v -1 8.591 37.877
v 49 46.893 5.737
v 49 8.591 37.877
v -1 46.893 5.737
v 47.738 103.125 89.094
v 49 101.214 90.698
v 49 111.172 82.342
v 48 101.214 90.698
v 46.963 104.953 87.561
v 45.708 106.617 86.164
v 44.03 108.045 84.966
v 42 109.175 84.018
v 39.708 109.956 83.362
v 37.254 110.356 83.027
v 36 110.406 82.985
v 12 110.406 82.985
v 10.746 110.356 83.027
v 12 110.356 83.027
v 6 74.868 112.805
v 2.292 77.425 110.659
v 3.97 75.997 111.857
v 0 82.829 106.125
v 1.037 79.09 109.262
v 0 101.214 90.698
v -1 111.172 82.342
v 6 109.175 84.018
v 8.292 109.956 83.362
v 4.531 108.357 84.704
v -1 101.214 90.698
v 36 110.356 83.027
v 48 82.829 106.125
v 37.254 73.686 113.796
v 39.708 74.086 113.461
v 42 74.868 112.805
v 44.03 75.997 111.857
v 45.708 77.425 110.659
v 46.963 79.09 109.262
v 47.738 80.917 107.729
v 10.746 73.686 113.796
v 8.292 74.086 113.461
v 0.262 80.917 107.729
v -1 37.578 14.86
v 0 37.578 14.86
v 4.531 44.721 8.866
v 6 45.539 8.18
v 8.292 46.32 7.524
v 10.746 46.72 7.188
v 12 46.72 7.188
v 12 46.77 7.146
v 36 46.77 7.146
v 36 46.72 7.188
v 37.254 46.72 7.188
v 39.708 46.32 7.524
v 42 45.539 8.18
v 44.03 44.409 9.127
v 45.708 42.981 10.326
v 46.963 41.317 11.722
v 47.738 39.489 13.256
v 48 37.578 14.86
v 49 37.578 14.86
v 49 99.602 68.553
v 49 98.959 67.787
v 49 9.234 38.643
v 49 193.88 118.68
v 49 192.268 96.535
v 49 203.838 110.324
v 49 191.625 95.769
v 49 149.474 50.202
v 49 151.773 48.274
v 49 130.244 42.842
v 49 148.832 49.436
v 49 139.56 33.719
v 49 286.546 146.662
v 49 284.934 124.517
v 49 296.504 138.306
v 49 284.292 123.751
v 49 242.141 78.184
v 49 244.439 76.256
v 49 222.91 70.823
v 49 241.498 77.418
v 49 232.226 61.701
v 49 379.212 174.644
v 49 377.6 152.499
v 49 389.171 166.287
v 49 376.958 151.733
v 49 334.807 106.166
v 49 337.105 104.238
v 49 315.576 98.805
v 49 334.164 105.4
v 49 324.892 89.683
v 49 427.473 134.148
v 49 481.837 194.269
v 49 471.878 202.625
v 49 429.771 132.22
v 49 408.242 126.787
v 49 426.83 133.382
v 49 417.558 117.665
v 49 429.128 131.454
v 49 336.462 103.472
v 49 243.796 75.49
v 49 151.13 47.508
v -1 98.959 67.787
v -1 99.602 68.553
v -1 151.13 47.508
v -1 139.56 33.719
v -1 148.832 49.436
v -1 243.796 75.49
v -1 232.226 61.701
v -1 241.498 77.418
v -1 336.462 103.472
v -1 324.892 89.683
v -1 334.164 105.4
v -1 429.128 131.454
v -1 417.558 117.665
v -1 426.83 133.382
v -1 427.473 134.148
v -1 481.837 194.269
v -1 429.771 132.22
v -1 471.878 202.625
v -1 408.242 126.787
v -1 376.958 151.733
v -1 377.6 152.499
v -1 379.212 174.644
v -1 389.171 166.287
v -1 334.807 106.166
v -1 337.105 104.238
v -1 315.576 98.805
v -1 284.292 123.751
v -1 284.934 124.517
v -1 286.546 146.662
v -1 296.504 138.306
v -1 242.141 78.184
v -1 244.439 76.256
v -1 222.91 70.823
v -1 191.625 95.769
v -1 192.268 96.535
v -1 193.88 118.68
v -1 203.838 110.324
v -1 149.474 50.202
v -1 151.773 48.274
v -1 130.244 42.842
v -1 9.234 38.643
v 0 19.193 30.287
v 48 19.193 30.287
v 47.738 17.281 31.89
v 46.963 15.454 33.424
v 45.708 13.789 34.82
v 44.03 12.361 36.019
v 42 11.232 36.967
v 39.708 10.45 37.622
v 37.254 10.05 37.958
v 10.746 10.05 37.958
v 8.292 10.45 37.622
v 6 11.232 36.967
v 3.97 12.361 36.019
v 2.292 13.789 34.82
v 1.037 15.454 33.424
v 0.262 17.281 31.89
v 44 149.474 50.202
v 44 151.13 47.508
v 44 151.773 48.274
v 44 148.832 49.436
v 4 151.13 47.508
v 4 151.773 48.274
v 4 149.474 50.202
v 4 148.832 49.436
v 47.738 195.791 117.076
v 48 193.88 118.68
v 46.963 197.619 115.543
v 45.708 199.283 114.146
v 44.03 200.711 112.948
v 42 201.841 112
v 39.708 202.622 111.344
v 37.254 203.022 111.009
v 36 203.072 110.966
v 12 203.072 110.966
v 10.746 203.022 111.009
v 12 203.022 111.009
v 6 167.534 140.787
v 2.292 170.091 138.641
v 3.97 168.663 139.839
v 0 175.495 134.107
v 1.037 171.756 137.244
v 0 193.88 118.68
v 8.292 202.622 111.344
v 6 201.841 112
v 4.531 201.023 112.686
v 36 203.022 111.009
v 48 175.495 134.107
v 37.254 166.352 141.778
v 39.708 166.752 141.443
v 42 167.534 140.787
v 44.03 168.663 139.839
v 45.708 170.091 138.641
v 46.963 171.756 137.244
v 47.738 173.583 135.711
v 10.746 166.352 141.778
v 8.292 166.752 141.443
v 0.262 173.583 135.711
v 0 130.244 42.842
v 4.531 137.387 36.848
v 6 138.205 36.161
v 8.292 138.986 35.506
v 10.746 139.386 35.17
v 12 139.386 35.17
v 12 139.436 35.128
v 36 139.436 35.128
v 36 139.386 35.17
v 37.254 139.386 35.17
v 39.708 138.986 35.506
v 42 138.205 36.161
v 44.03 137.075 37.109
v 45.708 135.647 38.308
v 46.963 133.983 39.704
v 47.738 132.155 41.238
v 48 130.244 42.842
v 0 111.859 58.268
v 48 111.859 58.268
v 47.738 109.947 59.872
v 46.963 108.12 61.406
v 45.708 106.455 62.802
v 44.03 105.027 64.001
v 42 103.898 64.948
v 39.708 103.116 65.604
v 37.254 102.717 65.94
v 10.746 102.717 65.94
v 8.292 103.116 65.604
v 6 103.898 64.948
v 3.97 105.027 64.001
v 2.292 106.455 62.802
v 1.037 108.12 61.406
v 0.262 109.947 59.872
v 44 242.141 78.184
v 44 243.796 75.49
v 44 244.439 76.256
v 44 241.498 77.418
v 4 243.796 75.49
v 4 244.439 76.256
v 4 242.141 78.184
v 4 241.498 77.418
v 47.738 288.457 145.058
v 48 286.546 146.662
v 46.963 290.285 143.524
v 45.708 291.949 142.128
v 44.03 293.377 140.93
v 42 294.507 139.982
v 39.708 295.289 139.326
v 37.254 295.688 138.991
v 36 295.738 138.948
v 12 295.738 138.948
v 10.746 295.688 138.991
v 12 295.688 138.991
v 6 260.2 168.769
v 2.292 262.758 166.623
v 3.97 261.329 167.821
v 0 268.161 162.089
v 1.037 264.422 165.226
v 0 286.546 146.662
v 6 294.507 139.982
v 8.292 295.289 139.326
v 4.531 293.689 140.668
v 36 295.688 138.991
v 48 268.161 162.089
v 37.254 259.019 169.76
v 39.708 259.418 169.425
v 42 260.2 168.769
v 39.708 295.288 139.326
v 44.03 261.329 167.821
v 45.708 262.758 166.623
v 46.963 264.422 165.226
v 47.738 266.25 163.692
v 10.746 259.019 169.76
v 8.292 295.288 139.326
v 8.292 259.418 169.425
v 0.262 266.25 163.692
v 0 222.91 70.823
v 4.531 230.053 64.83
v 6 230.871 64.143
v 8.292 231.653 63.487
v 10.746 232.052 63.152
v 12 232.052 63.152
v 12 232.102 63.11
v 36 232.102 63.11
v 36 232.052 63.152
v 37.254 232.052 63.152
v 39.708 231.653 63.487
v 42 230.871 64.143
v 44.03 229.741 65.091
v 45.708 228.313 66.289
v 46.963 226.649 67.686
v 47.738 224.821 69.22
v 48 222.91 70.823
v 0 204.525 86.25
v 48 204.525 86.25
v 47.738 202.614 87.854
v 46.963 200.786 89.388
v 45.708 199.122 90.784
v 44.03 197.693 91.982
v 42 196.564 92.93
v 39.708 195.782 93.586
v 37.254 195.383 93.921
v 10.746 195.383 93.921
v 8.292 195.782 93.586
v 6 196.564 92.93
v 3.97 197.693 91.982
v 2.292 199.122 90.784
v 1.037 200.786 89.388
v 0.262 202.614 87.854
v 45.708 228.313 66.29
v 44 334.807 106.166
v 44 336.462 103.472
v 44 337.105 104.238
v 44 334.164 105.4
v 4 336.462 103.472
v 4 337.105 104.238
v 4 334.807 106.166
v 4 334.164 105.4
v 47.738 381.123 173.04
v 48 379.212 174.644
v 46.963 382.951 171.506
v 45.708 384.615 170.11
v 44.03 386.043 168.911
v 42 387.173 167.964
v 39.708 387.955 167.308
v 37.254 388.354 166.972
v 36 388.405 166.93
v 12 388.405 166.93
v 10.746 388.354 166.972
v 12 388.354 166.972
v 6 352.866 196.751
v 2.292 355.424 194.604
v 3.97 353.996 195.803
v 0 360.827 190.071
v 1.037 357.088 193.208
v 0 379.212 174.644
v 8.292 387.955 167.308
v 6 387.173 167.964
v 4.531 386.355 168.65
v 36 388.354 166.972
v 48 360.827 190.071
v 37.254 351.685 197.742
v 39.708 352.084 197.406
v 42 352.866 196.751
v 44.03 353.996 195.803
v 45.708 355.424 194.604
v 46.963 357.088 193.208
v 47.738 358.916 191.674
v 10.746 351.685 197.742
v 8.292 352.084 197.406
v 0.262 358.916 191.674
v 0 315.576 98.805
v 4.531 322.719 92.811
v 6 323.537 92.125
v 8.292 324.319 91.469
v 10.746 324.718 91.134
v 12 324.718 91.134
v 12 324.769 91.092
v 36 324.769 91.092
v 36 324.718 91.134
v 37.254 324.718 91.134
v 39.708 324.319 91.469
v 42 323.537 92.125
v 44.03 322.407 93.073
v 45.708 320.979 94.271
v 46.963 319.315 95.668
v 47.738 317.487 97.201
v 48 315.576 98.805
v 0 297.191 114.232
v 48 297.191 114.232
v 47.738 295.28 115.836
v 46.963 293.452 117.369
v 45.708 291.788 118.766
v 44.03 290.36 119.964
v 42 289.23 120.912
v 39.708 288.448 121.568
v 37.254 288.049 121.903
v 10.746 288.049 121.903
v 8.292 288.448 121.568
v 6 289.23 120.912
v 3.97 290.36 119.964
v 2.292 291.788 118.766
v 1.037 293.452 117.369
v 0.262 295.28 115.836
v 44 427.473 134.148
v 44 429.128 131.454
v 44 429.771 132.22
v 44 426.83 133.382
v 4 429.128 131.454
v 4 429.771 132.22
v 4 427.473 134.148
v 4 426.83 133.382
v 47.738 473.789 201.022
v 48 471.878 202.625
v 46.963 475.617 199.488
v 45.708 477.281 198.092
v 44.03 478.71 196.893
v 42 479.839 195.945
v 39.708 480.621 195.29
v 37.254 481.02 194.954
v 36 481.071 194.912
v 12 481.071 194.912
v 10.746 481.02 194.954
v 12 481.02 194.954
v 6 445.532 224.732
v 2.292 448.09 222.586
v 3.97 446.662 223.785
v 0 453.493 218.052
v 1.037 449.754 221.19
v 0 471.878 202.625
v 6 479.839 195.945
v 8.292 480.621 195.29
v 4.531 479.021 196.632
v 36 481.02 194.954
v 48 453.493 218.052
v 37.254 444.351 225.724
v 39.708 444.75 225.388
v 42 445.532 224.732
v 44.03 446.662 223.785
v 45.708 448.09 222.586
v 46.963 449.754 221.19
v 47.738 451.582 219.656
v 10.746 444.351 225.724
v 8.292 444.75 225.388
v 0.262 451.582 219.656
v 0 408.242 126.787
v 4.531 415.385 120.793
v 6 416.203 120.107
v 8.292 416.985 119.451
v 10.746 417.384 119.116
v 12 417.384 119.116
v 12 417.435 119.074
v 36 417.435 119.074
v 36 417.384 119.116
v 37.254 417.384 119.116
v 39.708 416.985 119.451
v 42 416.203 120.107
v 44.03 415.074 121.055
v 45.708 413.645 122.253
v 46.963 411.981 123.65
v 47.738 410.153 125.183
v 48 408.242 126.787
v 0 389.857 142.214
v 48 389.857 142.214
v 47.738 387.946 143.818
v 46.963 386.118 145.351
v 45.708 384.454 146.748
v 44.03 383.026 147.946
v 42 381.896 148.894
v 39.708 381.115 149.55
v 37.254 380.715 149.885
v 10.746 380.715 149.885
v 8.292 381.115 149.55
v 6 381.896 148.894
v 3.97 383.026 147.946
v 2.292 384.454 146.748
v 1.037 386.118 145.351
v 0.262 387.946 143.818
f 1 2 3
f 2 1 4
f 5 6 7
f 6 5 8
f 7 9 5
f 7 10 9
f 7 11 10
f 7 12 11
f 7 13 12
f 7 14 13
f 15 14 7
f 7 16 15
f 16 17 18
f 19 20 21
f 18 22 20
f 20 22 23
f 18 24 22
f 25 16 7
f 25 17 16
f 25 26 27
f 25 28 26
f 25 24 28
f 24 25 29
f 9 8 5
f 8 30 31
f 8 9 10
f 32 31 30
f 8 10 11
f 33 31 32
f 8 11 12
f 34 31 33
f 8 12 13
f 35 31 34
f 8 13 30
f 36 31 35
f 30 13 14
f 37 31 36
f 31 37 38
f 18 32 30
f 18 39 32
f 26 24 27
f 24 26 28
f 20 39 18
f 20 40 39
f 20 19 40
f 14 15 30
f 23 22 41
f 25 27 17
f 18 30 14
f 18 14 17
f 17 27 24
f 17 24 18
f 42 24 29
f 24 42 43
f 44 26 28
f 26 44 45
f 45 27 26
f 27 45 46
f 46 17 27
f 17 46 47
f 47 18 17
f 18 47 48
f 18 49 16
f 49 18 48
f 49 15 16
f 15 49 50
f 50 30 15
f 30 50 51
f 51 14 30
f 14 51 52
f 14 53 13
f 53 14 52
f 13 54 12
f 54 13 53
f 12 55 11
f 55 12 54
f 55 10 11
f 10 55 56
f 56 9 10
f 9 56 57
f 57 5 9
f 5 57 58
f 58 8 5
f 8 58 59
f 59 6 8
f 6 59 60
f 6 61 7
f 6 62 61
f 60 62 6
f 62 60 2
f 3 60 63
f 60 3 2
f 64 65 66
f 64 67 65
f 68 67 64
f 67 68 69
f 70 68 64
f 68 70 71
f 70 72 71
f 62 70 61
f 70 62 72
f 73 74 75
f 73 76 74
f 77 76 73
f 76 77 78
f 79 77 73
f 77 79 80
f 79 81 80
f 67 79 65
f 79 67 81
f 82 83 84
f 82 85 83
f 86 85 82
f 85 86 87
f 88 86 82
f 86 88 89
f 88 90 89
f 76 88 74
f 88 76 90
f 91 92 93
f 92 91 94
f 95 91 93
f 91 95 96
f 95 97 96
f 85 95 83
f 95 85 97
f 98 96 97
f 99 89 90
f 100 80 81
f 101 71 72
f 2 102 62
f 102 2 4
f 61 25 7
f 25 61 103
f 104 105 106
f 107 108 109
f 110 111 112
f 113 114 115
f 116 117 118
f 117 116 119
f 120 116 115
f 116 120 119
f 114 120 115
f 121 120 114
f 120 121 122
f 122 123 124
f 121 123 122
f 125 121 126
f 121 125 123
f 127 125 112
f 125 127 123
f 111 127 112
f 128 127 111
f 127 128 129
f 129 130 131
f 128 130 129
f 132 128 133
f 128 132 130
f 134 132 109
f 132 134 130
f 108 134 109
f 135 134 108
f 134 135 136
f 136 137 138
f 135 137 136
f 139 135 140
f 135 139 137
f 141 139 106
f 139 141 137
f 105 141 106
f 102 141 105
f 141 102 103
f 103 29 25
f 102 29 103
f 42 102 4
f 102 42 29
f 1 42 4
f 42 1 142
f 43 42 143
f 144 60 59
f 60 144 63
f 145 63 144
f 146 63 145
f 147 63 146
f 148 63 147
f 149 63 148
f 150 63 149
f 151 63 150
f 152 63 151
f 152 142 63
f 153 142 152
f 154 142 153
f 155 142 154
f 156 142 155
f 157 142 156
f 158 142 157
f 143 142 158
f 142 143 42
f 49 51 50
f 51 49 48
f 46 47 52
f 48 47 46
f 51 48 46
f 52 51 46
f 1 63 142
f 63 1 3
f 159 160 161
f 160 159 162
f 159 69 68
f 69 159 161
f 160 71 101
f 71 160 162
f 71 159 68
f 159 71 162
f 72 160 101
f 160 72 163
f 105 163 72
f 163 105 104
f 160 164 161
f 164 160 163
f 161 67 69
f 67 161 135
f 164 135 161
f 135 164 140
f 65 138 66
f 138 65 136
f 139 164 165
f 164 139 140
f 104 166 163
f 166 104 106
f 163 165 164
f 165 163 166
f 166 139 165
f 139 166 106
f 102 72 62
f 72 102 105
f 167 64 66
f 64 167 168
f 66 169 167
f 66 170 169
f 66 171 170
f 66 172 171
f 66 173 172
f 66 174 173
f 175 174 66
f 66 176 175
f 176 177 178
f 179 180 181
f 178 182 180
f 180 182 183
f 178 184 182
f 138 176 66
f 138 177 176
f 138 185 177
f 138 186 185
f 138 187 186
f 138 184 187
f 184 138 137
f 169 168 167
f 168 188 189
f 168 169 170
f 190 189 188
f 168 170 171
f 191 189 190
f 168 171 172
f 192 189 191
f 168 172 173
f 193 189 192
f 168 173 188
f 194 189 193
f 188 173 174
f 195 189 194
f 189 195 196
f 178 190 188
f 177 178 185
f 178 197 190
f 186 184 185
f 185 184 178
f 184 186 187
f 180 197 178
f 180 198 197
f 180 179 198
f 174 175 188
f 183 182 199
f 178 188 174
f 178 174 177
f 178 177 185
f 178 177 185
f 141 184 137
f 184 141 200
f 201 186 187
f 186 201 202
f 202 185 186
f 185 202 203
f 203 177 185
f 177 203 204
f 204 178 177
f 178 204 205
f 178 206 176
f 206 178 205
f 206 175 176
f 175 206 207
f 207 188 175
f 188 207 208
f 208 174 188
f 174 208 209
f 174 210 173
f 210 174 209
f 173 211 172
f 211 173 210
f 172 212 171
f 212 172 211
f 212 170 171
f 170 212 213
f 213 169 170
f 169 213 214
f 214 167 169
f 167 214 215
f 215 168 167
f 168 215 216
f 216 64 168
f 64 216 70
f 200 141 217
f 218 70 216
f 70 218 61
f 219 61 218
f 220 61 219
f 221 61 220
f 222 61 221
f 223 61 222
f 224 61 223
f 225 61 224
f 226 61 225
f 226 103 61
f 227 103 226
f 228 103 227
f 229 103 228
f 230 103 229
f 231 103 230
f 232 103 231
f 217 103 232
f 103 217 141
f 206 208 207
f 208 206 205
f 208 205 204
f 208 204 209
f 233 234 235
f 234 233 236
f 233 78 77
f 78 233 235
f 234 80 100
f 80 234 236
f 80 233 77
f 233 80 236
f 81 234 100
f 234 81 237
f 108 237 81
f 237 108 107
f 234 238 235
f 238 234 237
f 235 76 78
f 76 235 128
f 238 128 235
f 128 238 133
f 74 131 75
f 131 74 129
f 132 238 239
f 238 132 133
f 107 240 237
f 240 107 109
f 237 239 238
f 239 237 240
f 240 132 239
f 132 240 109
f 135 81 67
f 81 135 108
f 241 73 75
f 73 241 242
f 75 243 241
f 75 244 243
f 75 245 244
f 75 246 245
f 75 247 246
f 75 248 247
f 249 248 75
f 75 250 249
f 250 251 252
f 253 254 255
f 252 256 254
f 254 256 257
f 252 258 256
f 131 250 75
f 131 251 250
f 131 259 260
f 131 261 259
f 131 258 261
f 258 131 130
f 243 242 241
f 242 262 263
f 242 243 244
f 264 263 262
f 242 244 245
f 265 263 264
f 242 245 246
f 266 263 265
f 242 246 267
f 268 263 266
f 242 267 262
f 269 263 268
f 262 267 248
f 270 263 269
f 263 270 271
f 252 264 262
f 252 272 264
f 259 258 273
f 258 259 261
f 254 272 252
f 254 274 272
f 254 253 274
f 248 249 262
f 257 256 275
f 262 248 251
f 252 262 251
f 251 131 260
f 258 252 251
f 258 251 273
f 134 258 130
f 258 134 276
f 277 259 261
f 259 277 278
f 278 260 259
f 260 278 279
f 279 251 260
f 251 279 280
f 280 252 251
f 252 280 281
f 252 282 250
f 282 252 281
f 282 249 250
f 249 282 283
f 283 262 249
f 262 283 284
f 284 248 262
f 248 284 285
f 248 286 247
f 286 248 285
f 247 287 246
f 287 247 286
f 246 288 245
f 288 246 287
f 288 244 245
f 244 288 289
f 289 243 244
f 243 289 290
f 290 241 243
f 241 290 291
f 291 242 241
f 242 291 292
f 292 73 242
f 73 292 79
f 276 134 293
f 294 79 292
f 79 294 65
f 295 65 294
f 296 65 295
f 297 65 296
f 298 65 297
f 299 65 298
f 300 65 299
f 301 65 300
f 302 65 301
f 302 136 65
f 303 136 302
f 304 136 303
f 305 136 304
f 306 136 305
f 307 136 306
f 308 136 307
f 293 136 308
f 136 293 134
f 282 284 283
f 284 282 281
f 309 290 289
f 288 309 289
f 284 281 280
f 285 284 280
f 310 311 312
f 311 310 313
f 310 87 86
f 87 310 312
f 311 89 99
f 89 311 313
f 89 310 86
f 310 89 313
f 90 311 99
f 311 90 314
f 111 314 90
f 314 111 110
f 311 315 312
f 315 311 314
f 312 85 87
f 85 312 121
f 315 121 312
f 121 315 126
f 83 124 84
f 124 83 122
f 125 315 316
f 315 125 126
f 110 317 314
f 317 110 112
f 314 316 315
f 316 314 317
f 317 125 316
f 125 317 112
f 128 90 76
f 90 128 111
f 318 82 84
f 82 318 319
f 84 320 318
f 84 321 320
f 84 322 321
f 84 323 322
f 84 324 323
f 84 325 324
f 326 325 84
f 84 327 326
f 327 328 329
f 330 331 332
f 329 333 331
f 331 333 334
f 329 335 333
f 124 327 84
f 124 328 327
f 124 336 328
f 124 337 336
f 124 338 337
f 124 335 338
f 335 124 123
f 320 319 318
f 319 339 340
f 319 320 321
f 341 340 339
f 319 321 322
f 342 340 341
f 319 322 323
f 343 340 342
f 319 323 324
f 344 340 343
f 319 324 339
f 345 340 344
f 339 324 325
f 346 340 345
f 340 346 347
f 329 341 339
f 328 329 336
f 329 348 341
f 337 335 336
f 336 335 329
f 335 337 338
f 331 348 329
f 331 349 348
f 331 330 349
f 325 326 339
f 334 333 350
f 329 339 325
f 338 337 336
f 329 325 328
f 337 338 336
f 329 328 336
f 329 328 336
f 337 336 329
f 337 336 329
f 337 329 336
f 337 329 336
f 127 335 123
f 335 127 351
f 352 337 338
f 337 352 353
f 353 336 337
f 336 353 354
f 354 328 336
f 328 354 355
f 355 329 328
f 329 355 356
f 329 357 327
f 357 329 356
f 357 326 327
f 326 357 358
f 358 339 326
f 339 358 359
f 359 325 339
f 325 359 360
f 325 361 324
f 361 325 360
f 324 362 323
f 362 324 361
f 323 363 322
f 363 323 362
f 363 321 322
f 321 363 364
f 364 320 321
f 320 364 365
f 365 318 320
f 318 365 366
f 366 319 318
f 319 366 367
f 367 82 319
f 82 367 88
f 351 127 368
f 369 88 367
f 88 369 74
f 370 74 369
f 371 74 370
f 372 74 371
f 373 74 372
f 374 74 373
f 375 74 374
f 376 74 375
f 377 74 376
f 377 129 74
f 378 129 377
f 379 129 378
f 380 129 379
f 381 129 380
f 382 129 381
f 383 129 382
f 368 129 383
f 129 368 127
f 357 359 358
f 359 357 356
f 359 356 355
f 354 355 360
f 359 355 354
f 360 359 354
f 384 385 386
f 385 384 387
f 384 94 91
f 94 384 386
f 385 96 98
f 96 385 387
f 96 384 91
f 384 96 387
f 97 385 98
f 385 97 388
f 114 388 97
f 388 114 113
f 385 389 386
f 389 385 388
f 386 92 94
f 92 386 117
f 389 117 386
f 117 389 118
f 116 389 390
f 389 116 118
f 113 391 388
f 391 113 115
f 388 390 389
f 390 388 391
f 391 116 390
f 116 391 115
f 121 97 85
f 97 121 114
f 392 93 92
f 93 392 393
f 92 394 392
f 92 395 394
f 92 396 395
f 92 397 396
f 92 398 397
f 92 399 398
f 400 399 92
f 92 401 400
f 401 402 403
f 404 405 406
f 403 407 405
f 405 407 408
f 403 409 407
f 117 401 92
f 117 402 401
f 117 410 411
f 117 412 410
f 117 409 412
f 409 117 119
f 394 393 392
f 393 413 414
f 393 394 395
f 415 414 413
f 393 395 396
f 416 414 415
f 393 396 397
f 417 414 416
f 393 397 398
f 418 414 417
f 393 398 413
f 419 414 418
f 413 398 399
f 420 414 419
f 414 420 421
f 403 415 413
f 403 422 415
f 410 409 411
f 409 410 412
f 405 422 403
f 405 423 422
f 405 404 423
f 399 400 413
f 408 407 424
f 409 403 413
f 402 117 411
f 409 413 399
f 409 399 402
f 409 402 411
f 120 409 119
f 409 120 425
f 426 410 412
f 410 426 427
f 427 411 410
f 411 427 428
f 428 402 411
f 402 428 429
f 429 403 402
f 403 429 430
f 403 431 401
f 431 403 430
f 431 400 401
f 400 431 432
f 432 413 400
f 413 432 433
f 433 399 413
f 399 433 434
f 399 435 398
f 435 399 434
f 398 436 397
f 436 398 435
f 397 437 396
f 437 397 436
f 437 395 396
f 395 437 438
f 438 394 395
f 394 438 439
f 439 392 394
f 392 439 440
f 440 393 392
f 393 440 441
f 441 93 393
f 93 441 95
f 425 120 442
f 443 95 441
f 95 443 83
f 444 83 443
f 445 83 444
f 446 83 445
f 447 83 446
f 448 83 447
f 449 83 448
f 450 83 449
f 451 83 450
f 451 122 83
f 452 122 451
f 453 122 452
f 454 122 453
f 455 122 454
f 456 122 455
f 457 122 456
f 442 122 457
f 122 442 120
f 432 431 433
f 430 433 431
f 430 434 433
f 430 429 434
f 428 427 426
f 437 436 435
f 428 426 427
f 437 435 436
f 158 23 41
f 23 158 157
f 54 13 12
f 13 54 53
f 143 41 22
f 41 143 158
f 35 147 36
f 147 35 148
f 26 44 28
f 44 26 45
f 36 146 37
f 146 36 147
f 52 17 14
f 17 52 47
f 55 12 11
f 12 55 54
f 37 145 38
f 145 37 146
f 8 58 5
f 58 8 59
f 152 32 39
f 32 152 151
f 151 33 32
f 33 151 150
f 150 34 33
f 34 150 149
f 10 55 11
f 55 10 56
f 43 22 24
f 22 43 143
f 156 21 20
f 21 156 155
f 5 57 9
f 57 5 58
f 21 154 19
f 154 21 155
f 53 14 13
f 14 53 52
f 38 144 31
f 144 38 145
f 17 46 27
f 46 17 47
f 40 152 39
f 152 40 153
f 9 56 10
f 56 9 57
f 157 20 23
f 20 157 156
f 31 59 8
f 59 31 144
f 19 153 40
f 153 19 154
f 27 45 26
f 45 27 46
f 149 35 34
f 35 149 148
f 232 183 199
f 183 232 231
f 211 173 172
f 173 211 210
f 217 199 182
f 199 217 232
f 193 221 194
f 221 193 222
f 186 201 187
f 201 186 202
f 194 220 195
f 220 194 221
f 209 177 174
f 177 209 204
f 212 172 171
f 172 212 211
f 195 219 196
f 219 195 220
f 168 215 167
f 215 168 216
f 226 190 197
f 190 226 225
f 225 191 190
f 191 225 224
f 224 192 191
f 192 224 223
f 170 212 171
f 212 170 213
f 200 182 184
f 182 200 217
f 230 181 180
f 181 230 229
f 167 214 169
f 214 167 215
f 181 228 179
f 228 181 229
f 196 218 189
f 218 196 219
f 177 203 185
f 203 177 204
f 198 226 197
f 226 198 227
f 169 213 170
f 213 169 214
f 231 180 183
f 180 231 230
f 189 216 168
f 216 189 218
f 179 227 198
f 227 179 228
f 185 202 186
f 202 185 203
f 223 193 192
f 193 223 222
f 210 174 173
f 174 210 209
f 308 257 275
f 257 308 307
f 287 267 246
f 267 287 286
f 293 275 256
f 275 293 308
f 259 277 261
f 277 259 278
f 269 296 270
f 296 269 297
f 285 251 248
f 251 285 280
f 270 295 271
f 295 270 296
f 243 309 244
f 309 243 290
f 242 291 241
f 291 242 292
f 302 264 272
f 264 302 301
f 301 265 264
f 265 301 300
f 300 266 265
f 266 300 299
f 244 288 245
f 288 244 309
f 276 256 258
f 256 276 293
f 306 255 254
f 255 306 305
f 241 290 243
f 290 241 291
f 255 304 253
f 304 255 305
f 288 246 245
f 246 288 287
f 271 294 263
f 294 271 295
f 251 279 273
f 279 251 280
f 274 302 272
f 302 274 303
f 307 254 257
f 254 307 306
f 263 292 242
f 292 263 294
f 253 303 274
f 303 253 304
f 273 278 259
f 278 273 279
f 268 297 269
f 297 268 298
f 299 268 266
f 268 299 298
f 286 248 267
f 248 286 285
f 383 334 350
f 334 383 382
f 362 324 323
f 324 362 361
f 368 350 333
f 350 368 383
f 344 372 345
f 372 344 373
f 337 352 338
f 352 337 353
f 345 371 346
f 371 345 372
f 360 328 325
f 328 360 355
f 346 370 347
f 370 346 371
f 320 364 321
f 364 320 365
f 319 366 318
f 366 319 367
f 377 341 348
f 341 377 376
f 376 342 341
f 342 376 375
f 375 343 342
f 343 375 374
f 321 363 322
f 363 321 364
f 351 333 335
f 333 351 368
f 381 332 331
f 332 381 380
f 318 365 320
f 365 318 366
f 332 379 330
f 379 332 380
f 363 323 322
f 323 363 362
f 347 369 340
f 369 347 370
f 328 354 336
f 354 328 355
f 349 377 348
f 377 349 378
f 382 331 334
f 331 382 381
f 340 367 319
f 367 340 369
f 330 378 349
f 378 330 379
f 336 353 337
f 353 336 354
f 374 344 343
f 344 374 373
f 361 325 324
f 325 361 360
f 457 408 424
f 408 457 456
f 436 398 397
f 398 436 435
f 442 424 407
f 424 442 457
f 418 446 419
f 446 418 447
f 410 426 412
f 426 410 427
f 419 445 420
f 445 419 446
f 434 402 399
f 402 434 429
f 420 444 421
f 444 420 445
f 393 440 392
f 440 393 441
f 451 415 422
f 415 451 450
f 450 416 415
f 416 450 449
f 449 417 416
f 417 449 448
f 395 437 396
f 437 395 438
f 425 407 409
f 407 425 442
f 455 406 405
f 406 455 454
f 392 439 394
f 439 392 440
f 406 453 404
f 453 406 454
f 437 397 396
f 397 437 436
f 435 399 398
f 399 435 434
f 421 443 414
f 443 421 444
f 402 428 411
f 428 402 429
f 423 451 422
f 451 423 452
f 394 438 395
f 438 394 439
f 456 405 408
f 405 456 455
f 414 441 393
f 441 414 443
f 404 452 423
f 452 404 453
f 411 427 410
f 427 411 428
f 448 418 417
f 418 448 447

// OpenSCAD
// file: organizer-drawer_780x470x255-jar_99x48.scad
use <../drawers/drawer-780x470x255.scad>;
use <../jars/jar-rectangular-99x48.scad>;

function side_wall_minimum_thickness() = 1;
function foot_wall_minimum_thickness() = side_wall_minimum_thickness();
function organizer_width() = jar_width() + side_wall_minimum_thickness() * 2;
function side_length() = jar_height() + side_wall_minimum_thickness();
function side_height() = jar_round_edge_radius();

function side_attachment_slot_width() = 5;
function side_attachment_slot_depth() = 3;

module organizer_side(ol = 0) {
    difference() {
        linear_extrude(side_length())
        difference() {
            square([organizer_width(), side_height() + side_wall_minimum_thickness()]);
            translate([jar_round_edge_radius() + side_wall_minimum_thickness(), jar_round_edge_radius() + side_wall_minimum_thickness()])circle(jar_round_edge_radius());
            translate([jar_width() - jar_round_edge_radius() + side_wall_minimum_thickness(), jar_round_edge_radius() + side_wall_minimum_thickness()])circle(jar_round_edge_radius());
            translate([side_wall_minimum_thickness() + jar_round_edge_radius(), side_wall_minimum_thickness()]) square([jar_width() - 2 * jar_round_edge_radius(), side_height()]);
        }

        if (ol > 0) {
            translate([0, 0, ol]) cube([side_attachment_slot_width(), side_attachment_slot_depth(), foot_wall_minimum_thickness()]);
            translate([organizer_width() - side_attachment_slot_width(), 0, ol]) cube([side_attachment_slot_width(), side_attachment_slot_depth(), foot_wall_minimum_thickness()]);
        }
    }
}

module organizer_foot(lf = 0, ol = 0) {
    attachmen_slot_offset_y = organizer_width() + lf;
    attachmen_slot_offset_x = organizer_width() - side_attachment_slot_width();
    union() {
        cube([organizer_width(), organizer_width() + lf, foot_wall_minimum_thickness()]);
        if (ol > 0) {
            translate([0, attachmen_slot_offset_y, 0]) cube([side_attachment_slot_width(), side_attachment_slot_depth(), foot_wall_minimum_thickness()]);
            translate([attachmen_slot_offset_x, attachmen_slot_offset_y, 0]) cube([side_attachment_slot_width(), side_attachment_slot_depth(), foot_wall_minimum_thickness()]);
        }
    }
}

module organizer(
    ol = 0, // overlap - used to determine where the foot of the next organizer will attach to the side of the current one
    lf = 0, // loose fit - distance between two organizers so it is easy to slide in jar into overlapping organizers
) {
    translate([jar_width() + side_wall_minimum_thickness(), jar_width() + side_wall_minimum_thickness(), -side_wall_minimum_thickness()])
    rotate([0, 0, 180])
    difference() {
        union() {
            organizer_side(ol);
            organizer_foot(lf = lf, ol = ol);
        }
    }
}

organizer(lf = 5, ol = 15);
// file: ../jars/jar-rectangular-99x48.scad
function jar_height() = 99; // millimeters
function jar_width() = 48;
function jar_round_edge_radius() = 12;

module jar() {
    linear_extrude(height = jar_height())
    hull() {
        translate([jar_round_edge_radius(), jar_round_edge_radius()]) circle(r = jar_round_edge_radius());
        translate([jar_width() - jar_round_edge_radius(), jar_round_edge_radius()]) circle(r = jar_round_edge_radius());
        translate([jar_width() - jar_round_edge_radius(), jar_width() - jar_round_edge_radius()]) circle(r = jar_round_edge_radius());
        translate([jar_round_edge_radius(), jar_width() - jar_round_edge_radius()]) circle(r = jar_round_edge_radius());
    }
}

jar();
// file: ../drawers/drawer-780x470x255.scad
// These are the usable inner dimension of the drawer.
function drawer_inner_depth() = 471; // millimeters
function drawer_inner_width() = 780;
function drawer_inner_front_height() = 255;
function drawer_inner_back_height() = 160;
function drawer_inner_height() = max(drawer_inner_front_height(), drawer_inner_back_height());

function drawer_side_wall_thickness() = 15; // Does not matter in regards to usable space

module drawer_bottom() {
    width = drawer_inner_width() + 2* drawer_side_wall_thickness();
    height = drawer_side_wall_thickness();
    depth = drawer_inner_depth() + 2* drawer_side_wall_thickness();

    // make the innner space of the drawer aligned with coordinates [0,0,0]
    offset_x = -drawer_side_wall_thickness();
    offset_y = -drawer_side_wall_thickness();
    offset_z = -drawer_side_wall_thickness();

    translate([offset_x, offset_y, offset_z]) cube([width, depth, height]);
}

module drawer_front() {
    width = drawer_inner_width() + 2* drawer_side_wall_thickness();
    height = drawer_inner_height();
    depth = drawer_side_wall_thickness();

    offset_x = -drawer_side_wall_thickness();
    offset_y = -drawer_side_wall_thickness();
    offset_z = -drawer_side_wall_thickness();

    handle_width = 160;
    handle_depth = 20;
    handle_height = 20;

    // make the innner space of the drawer aligned with coordinates [0,0,0]
    handle_offset_x = offset_x + width / 2 - handle_width / 2;
    handle_offset_y = offset_y - handle_depth;
    handle_offset_z = offset_z + height / 2 - handle_height / 2;

    union() {
        // front panel
        translate([offset_x, offset_y, offset_z]) cube([width, depth, height]);
        translate([handle_offset_x, handle_offset_y, handle_offset_z]) {
            cube([handle_width, handle_depth, handle_height]);
        }
    }
}

module drawer_side(s = "left") {
    width = drawer_side_wall_thickness();
    height = drawer_inner_height();
    depth = drawer_inner_depth() + 2* drawer_side_wall_thickness();

    offset_y = -drawer_side_wall_thickness();
    offset_z = -drawer_side_wall_thickness();
    if (s == "right") {
        offset_x = drawer_inner_width() + drawer_side_wall_thickness();
        translate([offset_x, offset_y, offset_z]) cube([width, depth, height]);
    } else {
        offset_x = -drawer_side_wall_thickness();
        translate([offset_x, offset_y, offset_z]) cube([width, depth, height]);
    }
}

module drawer_back() {
    width = drawer_inner_width() + 2* drawer_side_wall_thickness();
    height = drawer_inner_back_height();
    depth = drawer_side_wall_thickness();

    offset_x = -drawer_side_wall_thickness();
    offset_y = drawer_inner_depth();
    offset_z = -drawer_side_wall_thickness();

    translate([offset_x, offset_y, offset_z]) cube([width, depth, height]);
}

module drawer() {
    union() {
        drawer_bottom();
        drawer_front();
        drawer_side(s = "left");
        drawer_side(s = "right");
        drawer_back();
    }
}

drawer();
// main file
use <../drawers/drawer-780x470x255.scad>;
use <../jars/jar-rectangular-99x48.scad>;
use <organizer-drawer_780x470x255-jar_99x48.scad>;


function rows() = 5;
function columns() = 1;

function overlap() = 18; // mm
function overlap_loose_fit() = 3;

function rotate_x() = -40;
function column_offset_y() = 10;
function column_offset_z() = -10;

module column() {
    for (i = [0:rows() - 1]) {
        offset_y = i * (organizer_width() + overlap_loose_fit());
        offset_z = i * (jar_height() - overlap());
        translate([0, offset_y, offset_z]) jar();
        if (i > 0) {
            color("red") translate([0, offset_y, offset_z]) organizer(ol = overlap(), lf = overlap_loose_fit());
        } else {
            color("green") translate([0, offset_y, offset_z]) organizer();
        }
    }
}

module rotated_column() {
    translate([0, 0, jar_width()])
    rotate([rotate_x(), 0, 0]) column();
}

module sketch() {
    for (j = [0:columns() - 1]) {
        offset_x = j * organizer_width();
        translate([offset_x, column_offset_y(), column_offset_z()]) rotated_column();
    }
}

%drawer();
sketch();
